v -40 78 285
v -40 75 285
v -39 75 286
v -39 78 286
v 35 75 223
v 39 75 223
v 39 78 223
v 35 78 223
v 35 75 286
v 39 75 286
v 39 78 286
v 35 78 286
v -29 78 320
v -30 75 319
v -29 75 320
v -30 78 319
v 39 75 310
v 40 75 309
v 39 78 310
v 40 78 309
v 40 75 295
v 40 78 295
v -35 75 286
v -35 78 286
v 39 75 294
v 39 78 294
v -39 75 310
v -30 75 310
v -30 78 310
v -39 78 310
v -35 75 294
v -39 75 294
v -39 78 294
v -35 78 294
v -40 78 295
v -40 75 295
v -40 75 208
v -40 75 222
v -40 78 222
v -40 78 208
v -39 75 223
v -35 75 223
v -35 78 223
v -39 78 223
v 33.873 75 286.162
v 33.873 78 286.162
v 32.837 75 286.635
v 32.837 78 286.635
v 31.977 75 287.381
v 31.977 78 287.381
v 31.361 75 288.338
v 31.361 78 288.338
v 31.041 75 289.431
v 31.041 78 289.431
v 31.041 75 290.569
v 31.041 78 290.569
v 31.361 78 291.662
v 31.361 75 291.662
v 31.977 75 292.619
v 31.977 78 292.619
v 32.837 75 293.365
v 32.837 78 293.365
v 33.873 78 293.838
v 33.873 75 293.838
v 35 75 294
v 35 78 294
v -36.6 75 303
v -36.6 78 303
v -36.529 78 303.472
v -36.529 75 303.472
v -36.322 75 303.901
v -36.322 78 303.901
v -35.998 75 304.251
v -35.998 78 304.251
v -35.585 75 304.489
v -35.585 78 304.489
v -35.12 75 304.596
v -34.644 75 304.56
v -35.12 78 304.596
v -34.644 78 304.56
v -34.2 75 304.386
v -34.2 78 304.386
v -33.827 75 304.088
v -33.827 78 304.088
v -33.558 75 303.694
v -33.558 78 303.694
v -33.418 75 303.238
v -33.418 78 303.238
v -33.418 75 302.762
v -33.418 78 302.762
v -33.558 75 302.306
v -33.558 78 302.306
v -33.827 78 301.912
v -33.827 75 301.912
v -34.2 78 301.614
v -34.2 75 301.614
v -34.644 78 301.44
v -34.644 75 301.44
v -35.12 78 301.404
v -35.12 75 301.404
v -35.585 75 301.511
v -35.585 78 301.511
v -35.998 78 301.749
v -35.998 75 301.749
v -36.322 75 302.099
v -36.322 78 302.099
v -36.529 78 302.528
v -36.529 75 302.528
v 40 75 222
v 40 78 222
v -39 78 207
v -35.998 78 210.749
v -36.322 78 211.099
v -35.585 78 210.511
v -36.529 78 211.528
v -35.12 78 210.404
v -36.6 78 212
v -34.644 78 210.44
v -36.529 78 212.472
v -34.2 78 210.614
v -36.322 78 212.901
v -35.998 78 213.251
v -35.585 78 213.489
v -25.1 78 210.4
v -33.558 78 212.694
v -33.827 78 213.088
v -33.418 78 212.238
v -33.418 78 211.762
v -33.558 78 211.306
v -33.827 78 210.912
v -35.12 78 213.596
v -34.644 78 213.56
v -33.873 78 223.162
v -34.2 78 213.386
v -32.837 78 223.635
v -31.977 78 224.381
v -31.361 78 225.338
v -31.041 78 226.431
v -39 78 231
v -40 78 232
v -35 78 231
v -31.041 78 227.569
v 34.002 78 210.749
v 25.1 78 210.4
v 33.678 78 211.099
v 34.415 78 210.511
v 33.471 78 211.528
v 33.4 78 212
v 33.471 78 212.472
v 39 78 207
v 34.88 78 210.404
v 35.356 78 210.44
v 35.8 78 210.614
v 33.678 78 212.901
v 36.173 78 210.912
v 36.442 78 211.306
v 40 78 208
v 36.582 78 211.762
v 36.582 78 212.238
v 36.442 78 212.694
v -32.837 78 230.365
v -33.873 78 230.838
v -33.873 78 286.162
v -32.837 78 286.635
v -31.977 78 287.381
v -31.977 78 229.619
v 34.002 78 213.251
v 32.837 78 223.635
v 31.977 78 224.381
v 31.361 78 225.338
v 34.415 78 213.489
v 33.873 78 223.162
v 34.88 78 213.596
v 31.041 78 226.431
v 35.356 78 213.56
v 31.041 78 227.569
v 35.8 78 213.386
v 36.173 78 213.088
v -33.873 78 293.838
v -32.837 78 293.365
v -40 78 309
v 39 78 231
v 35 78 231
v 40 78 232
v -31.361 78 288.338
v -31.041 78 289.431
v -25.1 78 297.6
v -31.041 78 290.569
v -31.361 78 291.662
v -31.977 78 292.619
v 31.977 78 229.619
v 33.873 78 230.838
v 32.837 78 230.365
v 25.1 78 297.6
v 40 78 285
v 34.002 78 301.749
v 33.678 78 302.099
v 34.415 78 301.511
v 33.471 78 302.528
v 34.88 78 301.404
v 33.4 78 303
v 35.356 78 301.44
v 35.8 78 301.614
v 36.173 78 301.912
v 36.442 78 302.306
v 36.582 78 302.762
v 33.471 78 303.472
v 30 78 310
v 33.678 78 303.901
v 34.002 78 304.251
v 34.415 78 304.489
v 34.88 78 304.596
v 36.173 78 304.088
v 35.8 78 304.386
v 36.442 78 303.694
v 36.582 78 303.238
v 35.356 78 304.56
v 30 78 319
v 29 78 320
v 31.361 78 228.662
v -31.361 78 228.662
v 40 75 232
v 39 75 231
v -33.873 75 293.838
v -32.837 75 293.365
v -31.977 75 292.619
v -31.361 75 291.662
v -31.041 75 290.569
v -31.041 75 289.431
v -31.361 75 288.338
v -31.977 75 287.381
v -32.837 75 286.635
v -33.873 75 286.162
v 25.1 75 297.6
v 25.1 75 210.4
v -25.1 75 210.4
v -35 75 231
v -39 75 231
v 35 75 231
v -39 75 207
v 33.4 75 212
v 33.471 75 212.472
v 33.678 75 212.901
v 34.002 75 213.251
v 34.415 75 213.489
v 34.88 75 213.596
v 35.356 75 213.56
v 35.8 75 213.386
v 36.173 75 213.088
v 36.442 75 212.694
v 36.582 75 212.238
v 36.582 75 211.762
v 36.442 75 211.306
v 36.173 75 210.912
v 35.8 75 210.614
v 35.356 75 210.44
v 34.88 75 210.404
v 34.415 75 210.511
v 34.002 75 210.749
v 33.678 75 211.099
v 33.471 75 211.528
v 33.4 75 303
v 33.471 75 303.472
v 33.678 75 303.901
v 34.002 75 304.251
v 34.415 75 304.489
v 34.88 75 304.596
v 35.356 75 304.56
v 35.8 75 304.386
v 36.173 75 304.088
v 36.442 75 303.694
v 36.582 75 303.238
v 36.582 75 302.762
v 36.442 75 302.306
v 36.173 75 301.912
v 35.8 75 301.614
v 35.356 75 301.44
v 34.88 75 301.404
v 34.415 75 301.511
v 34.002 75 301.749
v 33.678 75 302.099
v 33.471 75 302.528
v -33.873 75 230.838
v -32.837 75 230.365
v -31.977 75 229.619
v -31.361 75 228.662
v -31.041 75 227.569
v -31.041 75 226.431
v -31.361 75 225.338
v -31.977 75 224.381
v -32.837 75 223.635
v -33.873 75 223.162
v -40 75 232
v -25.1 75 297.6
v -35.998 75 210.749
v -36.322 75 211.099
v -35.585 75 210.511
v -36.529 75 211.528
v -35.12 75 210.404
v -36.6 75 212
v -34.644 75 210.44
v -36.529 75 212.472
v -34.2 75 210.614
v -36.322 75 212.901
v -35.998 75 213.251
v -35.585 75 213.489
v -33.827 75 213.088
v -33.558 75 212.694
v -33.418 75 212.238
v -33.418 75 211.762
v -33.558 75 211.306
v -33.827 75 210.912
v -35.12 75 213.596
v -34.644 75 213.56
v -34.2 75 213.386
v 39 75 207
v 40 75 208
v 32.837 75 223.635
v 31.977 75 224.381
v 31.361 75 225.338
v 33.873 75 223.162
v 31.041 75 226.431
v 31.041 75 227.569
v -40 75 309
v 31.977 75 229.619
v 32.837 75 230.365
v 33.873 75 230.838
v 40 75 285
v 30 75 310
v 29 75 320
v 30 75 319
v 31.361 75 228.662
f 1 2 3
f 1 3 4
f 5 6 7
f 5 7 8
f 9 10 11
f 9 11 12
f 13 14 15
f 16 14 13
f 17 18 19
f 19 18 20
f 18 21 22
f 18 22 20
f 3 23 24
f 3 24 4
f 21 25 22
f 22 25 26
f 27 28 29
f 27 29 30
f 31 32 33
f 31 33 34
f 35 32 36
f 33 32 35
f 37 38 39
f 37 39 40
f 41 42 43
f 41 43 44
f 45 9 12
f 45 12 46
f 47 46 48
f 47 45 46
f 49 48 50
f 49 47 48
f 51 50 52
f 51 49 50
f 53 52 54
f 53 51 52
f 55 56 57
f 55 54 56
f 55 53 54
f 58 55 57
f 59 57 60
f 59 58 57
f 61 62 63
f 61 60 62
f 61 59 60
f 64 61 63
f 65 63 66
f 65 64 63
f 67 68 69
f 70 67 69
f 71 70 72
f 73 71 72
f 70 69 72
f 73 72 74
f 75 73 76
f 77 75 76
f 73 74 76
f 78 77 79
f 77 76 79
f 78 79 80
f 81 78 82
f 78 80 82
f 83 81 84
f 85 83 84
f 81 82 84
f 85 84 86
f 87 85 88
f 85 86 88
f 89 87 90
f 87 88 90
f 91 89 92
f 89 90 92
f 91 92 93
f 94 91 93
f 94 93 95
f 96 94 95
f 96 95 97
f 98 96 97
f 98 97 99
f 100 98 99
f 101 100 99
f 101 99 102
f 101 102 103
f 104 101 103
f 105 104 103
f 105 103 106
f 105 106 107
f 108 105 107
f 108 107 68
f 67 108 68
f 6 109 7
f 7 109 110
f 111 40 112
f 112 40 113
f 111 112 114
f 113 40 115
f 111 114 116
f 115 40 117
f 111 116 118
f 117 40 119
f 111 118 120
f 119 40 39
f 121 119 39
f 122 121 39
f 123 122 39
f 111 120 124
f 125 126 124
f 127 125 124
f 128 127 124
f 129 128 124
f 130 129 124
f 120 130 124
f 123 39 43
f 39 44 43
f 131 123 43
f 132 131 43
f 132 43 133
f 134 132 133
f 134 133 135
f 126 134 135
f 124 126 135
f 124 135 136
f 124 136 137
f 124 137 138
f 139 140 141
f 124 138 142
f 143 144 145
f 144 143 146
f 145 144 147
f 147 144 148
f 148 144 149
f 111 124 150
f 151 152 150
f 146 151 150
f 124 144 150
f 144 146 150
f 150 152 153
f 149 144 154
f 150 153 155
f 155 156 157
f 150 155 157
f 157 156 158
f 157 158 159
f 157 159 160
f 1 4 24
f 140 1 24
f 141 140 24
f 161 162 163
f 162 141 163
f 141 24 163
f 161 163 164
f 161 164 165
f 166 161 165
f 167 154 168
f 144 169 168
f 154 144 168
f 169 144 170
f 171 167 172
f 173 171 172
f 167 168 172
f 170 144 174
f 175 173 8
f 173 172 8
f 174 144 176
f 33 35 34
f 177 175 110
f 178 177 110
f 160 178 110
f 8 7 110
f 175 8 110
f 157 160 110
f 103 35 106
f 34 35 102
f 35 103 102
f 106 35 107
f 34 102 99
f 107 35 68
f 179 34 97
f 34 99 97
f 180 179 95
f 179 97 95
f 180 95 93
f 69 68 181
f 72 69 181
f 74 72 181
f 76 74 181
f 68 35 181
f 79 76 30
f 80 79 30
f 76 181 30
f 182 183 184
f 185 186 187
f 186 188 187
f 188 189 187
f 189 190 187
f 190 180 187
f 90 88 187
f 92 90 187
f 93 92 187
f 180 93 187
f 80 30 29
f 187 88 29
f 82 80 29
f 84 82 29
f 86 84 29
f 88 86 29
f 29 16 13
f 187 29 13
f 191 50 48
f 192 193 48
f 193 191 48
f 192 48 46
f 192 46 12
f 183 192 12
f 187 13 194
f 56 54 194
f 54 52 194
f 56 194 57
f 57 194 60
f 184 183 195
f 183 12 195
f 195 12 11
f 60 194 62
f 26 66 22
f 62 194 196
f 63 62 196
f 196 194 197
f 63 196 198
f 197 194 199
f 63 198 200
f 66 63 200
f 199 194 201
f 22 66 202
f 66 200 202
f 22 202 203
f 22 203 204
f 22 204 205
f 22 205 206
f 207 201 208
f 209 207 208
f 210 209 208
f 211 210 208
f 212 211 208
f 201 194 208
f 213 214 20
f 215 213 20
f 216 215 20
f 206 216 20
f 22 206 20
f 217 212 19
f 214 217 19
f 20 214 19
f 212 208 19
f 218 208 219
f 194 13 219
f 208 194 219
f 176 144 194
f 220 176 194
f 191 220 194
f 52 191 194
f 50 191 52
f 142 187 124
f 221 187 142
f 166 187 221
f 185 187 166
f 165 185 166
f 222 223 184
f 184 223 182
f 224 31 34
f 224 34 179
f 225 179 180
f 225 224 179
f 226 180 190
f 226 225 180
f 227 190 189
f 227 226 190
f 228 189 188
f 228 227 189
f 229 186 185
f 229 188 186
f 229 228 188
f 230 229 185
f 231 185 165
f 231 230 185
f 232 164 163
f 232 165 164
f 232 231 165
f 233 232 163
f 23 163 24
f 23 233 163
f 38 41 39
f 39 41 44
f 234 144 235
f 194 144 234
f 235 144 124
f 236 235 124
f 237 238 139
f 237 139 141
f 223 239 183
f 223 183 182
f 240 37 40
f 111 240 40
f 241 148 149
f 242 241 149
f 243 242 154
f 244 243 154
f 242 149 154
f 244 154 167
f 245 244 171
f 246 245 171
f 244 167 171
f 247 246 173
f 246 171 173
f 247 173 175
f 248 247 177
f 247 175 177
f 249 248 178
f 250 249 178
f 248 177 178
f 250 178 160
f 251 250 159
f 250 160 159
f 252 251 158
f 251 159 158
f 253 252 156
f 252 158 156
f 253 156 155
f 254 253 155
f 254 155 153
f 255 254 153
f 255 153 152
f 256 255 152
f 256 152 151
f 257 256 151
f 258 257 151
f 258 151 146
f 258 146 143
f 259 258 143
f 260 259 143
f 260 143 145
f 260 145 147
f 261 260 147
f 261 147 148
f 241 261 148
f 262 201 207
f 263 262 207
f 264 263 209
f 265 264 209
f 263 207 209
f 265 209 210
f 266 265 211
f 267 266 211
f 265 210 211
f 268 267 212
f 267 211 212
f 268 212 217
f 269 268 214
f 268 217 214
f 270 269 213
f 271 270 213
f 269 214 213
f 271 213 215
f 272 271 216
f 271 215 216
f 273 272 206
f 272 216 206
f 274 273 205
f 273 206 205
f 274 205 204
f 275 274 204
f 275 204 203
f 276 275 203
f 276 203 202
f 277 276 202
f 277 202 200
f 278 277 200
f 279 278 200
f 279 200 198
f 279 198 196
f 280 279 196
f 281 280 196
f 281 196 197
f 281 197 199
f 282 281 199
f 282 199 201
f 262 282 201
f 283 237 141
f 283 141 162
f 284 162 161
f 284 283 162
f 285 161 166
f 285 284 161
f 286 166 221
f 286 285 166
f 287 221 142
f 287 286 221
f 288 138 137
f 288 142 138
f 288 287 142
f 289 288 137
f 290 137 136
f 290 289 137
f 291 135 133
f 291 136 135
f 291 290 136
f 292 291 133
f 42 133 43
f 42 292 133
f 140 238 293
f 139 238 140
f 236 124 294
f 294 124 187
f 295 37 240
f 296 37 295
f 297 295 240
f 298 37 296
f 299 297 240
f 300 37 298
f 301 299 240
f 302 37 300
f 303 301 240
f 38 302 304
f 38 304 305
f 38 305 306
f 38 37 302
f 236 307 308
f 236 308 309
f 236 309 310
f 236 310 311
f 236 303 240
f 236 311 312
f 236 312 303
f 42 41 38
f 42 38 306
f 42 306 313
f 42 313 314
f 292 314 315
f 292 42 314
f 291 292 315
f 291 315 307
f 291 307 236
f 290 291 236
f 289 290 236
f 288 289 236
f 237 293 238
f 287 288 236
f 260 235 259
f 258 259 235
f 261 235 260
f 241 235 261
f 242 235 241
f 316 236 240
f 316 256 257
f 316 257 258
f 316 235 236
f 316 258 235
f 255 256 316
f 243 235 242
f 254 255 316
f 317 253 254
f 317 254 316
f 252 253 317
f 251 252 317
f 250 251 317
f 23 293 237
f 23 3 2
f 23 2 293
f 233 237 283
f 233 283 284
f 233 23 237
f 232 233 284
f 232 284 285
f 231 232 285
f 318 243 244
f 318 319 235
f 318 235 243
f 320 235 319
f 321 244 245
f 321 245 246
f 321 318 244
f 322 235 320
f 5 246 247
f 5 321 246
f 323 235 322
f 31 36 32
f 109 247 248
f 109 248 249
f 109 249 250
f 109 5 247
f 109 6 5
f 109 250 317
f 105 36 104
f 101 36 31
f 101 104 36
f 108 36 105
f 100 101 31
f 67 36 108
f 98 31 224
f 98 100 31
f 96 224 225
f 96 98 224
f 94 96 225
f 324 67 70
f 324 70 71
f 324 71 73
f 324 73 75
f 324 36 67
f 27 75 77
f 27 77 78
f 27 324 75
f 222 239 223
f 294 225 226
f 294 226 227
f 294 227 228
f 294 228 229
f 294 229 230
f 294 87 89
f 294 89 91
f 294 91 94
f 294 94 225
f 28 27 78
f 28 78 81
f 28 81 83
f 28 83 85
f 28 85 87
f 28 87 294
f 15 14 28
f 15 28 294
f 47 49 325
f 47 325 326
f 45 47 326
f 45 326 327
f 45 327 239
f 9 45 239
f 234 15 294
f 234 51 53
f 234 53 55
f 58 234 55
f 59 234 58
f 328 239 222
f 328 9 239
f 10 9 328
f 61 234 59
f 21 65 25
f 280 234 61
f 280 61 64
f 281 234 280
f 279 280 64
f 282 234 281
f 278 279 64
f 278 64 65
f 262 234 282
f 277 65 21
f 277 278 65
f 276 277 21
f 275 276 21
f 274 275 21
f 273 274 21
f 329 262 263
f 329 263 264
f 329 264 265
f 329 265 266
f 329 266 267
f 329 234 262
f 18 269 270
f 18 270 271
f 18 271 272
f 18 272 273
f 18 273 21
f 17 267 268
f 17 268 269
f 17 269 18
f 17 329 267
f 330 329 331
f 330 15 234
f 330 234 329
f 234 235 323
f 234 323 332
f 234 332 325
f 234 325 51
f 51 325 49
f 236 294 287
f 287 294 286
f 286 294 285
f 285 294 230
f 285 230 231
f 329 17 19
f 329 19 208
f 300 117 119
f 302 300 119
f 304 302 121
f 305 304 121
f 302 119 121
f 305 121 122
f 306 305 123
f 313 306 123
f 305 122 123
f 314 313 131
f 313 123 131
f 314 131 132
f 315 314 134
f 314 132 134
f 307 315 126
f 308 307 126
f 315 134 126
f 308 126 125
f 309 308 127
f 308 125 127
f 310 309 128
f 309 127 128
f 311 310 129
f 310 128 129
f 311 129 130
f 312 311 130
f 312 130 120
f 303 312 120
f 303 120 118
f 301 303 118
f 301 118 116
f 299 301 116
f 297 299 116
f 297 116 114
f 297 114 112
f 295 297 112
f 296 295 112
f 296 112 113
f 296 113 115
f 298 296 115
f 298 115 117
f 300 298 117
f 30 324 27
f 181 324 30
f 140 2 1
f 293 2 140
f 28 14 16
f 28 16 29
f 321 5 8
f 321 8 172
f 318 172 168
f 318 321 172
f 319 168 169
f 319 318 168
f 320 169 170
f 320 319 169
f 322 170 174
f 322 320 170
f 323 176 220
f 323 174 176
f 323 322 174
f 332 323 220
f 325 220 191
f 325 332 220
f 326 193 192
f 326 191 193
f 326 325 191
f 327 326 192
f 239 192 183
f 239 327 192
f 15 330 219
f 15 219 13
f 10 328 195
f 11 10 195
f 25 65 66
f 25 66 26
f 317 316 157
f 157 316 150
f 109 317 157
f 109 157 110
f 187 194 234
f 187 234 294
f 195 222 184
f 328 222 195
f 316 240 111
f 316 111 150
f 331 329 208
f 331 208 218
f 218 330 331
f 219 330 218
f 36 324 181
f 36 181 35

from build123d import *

# Parameters (mm, degrees)
PAD098_DEPTH    = 3
POCKET028_DEPTH = 3.001
SKETCH185_R     = 1.6
SKETCH185_W     = 50
SKETCH185_H     = 69.2
POCKET029_DEPTH = 3.001
SKETCH209_W     = 50.2
SKETCH209_H     = 87.2
POCKET043_DEPTH = 5
CHAMFER073_SIZE = 1
SKETCH214_R     = 1.6
POCKET046_DEPTH = 3.001


with BuildPart() as part:
    # Sketch183 → Pad098 (new body)
    with BuildSketch(Plane(origin=(0, 0, 0), x_dir=(-1, 0, 0), z_dir=(0, 1, 0))):
        Polygon((-40, 310), (-30, 310), (-30, 320), (30, 320), (30, 310), (40, 310), (40, 207), (-40, 207), align=None)
    extrude(amount=PAD098_DEPTH)

    # Sketch184 → Pocket028 (cut, through all)
    with BuildSketch(Plane(origin=(0, 0, 0), x_dir=(-1, 0, 0), z_dir=(0, 1, 0))):
        with BuildLine():
            ThreePointArc((-40, 294), (-44, 290), (-40, 286))
            Line((-40, 286), (-35, 286))
            ThreePointArc((-35, 286), (-31, 290), (-35, 294))
            Line((-35, 294), (-40, 294))
        make_face()
        with BuildLine():
            ThreePointArc((-40, 231), (-44, 227), (-40, 223))
            Line((-40, 223), (-35, 223))
            ThreePointArc((-35, 223), (-31, 227), (-35, 231))
            Line((-35, 231), (-40, 231))
        make_face()
        with BuildLine():
            ThreePointArc((40, 223), (44, 227), (40, 231))
            Line((40, 231), (35, 231))
            ThreePointArc((35, 231), (31, 227), (35, 223))
            Line((35, 223), (40, 223))
        make_face()
        with BuildLine():
            ThreePointArc((40, 286), (44, 290), (40, 294))
            Line((40, 294), (35, 294))
            ThreePointArc((35, 294), (31, 290), (35, 286))
            Line((35, 286), (40, 286))
        make_face()
    extrude(amount=POCKET028_DEPTH, mode=Mode.SUBTRACT)

    # Sketch185 (on Face5 of Pocket028) → Pocket029 (cut, through all)
    with BuildSketch(Plane(origin=(0, 3, 0), x_dir=(-1, 0, 0), z_dir=(0, 1, 0))):
        with Locations((22, 217.92)):
            Circle(SKETCH185_R)
        with Locations((-22, 217.92)):
            Circle(SKETCH185_R)
        with Locations((-22, 294)):
            Circle(SKETCH185_R)
        with Locations((22, 294)):
            Circle(SKETCH185_R)
        with Locations((0, 256)):
            Rectangle(SKETCH185_W, SKETCH185_H)
    extrude(amount=-POCKET029_DEPTH, mode=Mode.SUBTRACT)

    # Sketch209 (on Face5 of Pocket029) → Pocket043 (cut)
    with BuildSketch(Plane(origin=(0, 3, 0), x_dir=(-1, 0, 0), z_dir=(0, 1, 0))):
        with Locations((0, 254)):
            Rectangle(SKETCH209_W, SKETCH209_H)
    extrude(amount=-POCKET043_DEPTH, mode=Mode.SUBTRACT)

    # Chamfer073
    chamfer073_edges = [part.edges().sort_by_distance(p)[0] for p in [
        (-30, 1.5, 320),
        (-40, 1.5, 310),
        (-40, 1.5, 294),
        (-40, 1.5, 286),
        (-40, 1.5, 223),
        (-40, 1.5, 231),
        (-40, 1.5, 207),
        (40, 1.5, 207),
        (40, 1.5, 223),
        (40, 1.5, 231),
        (40, 1.5, 294),
        (40, 1.5, 286),
        (40, 1.5, 310),
        (30, 1.5, 320),
    ]]
    chamfer(chamfer073_edges, length=CHAMFER073_SIZE)

    # Sketch214 (on Face5 of Chamfer073) → Pocket046 (cut, through all)
    with BuildSketch(Plane(origin=(0, 3, 0), x_dir=(-1, 0, 0), z_dir=(0, 1, 0))):
        with Locations((35, 212)):
            Circle(SKETCH214_R)
        with Locations((-35, 212)):
            Circle(SKETCH214_R)
        with Locations((-35, 303)):
            Circle(SKETCH214_R)
        with Locations((35, 303)):
            Circle(SKETCH214_R)
    extrude(amount=-POCKET046_DEPTH, mode=Mode.SUBTRACT)


with BuildPart() as part_1:
    # Body086 placement: moved
    add(part.part.moved(Location((0, 75, 0))))


solid = part_1.part
